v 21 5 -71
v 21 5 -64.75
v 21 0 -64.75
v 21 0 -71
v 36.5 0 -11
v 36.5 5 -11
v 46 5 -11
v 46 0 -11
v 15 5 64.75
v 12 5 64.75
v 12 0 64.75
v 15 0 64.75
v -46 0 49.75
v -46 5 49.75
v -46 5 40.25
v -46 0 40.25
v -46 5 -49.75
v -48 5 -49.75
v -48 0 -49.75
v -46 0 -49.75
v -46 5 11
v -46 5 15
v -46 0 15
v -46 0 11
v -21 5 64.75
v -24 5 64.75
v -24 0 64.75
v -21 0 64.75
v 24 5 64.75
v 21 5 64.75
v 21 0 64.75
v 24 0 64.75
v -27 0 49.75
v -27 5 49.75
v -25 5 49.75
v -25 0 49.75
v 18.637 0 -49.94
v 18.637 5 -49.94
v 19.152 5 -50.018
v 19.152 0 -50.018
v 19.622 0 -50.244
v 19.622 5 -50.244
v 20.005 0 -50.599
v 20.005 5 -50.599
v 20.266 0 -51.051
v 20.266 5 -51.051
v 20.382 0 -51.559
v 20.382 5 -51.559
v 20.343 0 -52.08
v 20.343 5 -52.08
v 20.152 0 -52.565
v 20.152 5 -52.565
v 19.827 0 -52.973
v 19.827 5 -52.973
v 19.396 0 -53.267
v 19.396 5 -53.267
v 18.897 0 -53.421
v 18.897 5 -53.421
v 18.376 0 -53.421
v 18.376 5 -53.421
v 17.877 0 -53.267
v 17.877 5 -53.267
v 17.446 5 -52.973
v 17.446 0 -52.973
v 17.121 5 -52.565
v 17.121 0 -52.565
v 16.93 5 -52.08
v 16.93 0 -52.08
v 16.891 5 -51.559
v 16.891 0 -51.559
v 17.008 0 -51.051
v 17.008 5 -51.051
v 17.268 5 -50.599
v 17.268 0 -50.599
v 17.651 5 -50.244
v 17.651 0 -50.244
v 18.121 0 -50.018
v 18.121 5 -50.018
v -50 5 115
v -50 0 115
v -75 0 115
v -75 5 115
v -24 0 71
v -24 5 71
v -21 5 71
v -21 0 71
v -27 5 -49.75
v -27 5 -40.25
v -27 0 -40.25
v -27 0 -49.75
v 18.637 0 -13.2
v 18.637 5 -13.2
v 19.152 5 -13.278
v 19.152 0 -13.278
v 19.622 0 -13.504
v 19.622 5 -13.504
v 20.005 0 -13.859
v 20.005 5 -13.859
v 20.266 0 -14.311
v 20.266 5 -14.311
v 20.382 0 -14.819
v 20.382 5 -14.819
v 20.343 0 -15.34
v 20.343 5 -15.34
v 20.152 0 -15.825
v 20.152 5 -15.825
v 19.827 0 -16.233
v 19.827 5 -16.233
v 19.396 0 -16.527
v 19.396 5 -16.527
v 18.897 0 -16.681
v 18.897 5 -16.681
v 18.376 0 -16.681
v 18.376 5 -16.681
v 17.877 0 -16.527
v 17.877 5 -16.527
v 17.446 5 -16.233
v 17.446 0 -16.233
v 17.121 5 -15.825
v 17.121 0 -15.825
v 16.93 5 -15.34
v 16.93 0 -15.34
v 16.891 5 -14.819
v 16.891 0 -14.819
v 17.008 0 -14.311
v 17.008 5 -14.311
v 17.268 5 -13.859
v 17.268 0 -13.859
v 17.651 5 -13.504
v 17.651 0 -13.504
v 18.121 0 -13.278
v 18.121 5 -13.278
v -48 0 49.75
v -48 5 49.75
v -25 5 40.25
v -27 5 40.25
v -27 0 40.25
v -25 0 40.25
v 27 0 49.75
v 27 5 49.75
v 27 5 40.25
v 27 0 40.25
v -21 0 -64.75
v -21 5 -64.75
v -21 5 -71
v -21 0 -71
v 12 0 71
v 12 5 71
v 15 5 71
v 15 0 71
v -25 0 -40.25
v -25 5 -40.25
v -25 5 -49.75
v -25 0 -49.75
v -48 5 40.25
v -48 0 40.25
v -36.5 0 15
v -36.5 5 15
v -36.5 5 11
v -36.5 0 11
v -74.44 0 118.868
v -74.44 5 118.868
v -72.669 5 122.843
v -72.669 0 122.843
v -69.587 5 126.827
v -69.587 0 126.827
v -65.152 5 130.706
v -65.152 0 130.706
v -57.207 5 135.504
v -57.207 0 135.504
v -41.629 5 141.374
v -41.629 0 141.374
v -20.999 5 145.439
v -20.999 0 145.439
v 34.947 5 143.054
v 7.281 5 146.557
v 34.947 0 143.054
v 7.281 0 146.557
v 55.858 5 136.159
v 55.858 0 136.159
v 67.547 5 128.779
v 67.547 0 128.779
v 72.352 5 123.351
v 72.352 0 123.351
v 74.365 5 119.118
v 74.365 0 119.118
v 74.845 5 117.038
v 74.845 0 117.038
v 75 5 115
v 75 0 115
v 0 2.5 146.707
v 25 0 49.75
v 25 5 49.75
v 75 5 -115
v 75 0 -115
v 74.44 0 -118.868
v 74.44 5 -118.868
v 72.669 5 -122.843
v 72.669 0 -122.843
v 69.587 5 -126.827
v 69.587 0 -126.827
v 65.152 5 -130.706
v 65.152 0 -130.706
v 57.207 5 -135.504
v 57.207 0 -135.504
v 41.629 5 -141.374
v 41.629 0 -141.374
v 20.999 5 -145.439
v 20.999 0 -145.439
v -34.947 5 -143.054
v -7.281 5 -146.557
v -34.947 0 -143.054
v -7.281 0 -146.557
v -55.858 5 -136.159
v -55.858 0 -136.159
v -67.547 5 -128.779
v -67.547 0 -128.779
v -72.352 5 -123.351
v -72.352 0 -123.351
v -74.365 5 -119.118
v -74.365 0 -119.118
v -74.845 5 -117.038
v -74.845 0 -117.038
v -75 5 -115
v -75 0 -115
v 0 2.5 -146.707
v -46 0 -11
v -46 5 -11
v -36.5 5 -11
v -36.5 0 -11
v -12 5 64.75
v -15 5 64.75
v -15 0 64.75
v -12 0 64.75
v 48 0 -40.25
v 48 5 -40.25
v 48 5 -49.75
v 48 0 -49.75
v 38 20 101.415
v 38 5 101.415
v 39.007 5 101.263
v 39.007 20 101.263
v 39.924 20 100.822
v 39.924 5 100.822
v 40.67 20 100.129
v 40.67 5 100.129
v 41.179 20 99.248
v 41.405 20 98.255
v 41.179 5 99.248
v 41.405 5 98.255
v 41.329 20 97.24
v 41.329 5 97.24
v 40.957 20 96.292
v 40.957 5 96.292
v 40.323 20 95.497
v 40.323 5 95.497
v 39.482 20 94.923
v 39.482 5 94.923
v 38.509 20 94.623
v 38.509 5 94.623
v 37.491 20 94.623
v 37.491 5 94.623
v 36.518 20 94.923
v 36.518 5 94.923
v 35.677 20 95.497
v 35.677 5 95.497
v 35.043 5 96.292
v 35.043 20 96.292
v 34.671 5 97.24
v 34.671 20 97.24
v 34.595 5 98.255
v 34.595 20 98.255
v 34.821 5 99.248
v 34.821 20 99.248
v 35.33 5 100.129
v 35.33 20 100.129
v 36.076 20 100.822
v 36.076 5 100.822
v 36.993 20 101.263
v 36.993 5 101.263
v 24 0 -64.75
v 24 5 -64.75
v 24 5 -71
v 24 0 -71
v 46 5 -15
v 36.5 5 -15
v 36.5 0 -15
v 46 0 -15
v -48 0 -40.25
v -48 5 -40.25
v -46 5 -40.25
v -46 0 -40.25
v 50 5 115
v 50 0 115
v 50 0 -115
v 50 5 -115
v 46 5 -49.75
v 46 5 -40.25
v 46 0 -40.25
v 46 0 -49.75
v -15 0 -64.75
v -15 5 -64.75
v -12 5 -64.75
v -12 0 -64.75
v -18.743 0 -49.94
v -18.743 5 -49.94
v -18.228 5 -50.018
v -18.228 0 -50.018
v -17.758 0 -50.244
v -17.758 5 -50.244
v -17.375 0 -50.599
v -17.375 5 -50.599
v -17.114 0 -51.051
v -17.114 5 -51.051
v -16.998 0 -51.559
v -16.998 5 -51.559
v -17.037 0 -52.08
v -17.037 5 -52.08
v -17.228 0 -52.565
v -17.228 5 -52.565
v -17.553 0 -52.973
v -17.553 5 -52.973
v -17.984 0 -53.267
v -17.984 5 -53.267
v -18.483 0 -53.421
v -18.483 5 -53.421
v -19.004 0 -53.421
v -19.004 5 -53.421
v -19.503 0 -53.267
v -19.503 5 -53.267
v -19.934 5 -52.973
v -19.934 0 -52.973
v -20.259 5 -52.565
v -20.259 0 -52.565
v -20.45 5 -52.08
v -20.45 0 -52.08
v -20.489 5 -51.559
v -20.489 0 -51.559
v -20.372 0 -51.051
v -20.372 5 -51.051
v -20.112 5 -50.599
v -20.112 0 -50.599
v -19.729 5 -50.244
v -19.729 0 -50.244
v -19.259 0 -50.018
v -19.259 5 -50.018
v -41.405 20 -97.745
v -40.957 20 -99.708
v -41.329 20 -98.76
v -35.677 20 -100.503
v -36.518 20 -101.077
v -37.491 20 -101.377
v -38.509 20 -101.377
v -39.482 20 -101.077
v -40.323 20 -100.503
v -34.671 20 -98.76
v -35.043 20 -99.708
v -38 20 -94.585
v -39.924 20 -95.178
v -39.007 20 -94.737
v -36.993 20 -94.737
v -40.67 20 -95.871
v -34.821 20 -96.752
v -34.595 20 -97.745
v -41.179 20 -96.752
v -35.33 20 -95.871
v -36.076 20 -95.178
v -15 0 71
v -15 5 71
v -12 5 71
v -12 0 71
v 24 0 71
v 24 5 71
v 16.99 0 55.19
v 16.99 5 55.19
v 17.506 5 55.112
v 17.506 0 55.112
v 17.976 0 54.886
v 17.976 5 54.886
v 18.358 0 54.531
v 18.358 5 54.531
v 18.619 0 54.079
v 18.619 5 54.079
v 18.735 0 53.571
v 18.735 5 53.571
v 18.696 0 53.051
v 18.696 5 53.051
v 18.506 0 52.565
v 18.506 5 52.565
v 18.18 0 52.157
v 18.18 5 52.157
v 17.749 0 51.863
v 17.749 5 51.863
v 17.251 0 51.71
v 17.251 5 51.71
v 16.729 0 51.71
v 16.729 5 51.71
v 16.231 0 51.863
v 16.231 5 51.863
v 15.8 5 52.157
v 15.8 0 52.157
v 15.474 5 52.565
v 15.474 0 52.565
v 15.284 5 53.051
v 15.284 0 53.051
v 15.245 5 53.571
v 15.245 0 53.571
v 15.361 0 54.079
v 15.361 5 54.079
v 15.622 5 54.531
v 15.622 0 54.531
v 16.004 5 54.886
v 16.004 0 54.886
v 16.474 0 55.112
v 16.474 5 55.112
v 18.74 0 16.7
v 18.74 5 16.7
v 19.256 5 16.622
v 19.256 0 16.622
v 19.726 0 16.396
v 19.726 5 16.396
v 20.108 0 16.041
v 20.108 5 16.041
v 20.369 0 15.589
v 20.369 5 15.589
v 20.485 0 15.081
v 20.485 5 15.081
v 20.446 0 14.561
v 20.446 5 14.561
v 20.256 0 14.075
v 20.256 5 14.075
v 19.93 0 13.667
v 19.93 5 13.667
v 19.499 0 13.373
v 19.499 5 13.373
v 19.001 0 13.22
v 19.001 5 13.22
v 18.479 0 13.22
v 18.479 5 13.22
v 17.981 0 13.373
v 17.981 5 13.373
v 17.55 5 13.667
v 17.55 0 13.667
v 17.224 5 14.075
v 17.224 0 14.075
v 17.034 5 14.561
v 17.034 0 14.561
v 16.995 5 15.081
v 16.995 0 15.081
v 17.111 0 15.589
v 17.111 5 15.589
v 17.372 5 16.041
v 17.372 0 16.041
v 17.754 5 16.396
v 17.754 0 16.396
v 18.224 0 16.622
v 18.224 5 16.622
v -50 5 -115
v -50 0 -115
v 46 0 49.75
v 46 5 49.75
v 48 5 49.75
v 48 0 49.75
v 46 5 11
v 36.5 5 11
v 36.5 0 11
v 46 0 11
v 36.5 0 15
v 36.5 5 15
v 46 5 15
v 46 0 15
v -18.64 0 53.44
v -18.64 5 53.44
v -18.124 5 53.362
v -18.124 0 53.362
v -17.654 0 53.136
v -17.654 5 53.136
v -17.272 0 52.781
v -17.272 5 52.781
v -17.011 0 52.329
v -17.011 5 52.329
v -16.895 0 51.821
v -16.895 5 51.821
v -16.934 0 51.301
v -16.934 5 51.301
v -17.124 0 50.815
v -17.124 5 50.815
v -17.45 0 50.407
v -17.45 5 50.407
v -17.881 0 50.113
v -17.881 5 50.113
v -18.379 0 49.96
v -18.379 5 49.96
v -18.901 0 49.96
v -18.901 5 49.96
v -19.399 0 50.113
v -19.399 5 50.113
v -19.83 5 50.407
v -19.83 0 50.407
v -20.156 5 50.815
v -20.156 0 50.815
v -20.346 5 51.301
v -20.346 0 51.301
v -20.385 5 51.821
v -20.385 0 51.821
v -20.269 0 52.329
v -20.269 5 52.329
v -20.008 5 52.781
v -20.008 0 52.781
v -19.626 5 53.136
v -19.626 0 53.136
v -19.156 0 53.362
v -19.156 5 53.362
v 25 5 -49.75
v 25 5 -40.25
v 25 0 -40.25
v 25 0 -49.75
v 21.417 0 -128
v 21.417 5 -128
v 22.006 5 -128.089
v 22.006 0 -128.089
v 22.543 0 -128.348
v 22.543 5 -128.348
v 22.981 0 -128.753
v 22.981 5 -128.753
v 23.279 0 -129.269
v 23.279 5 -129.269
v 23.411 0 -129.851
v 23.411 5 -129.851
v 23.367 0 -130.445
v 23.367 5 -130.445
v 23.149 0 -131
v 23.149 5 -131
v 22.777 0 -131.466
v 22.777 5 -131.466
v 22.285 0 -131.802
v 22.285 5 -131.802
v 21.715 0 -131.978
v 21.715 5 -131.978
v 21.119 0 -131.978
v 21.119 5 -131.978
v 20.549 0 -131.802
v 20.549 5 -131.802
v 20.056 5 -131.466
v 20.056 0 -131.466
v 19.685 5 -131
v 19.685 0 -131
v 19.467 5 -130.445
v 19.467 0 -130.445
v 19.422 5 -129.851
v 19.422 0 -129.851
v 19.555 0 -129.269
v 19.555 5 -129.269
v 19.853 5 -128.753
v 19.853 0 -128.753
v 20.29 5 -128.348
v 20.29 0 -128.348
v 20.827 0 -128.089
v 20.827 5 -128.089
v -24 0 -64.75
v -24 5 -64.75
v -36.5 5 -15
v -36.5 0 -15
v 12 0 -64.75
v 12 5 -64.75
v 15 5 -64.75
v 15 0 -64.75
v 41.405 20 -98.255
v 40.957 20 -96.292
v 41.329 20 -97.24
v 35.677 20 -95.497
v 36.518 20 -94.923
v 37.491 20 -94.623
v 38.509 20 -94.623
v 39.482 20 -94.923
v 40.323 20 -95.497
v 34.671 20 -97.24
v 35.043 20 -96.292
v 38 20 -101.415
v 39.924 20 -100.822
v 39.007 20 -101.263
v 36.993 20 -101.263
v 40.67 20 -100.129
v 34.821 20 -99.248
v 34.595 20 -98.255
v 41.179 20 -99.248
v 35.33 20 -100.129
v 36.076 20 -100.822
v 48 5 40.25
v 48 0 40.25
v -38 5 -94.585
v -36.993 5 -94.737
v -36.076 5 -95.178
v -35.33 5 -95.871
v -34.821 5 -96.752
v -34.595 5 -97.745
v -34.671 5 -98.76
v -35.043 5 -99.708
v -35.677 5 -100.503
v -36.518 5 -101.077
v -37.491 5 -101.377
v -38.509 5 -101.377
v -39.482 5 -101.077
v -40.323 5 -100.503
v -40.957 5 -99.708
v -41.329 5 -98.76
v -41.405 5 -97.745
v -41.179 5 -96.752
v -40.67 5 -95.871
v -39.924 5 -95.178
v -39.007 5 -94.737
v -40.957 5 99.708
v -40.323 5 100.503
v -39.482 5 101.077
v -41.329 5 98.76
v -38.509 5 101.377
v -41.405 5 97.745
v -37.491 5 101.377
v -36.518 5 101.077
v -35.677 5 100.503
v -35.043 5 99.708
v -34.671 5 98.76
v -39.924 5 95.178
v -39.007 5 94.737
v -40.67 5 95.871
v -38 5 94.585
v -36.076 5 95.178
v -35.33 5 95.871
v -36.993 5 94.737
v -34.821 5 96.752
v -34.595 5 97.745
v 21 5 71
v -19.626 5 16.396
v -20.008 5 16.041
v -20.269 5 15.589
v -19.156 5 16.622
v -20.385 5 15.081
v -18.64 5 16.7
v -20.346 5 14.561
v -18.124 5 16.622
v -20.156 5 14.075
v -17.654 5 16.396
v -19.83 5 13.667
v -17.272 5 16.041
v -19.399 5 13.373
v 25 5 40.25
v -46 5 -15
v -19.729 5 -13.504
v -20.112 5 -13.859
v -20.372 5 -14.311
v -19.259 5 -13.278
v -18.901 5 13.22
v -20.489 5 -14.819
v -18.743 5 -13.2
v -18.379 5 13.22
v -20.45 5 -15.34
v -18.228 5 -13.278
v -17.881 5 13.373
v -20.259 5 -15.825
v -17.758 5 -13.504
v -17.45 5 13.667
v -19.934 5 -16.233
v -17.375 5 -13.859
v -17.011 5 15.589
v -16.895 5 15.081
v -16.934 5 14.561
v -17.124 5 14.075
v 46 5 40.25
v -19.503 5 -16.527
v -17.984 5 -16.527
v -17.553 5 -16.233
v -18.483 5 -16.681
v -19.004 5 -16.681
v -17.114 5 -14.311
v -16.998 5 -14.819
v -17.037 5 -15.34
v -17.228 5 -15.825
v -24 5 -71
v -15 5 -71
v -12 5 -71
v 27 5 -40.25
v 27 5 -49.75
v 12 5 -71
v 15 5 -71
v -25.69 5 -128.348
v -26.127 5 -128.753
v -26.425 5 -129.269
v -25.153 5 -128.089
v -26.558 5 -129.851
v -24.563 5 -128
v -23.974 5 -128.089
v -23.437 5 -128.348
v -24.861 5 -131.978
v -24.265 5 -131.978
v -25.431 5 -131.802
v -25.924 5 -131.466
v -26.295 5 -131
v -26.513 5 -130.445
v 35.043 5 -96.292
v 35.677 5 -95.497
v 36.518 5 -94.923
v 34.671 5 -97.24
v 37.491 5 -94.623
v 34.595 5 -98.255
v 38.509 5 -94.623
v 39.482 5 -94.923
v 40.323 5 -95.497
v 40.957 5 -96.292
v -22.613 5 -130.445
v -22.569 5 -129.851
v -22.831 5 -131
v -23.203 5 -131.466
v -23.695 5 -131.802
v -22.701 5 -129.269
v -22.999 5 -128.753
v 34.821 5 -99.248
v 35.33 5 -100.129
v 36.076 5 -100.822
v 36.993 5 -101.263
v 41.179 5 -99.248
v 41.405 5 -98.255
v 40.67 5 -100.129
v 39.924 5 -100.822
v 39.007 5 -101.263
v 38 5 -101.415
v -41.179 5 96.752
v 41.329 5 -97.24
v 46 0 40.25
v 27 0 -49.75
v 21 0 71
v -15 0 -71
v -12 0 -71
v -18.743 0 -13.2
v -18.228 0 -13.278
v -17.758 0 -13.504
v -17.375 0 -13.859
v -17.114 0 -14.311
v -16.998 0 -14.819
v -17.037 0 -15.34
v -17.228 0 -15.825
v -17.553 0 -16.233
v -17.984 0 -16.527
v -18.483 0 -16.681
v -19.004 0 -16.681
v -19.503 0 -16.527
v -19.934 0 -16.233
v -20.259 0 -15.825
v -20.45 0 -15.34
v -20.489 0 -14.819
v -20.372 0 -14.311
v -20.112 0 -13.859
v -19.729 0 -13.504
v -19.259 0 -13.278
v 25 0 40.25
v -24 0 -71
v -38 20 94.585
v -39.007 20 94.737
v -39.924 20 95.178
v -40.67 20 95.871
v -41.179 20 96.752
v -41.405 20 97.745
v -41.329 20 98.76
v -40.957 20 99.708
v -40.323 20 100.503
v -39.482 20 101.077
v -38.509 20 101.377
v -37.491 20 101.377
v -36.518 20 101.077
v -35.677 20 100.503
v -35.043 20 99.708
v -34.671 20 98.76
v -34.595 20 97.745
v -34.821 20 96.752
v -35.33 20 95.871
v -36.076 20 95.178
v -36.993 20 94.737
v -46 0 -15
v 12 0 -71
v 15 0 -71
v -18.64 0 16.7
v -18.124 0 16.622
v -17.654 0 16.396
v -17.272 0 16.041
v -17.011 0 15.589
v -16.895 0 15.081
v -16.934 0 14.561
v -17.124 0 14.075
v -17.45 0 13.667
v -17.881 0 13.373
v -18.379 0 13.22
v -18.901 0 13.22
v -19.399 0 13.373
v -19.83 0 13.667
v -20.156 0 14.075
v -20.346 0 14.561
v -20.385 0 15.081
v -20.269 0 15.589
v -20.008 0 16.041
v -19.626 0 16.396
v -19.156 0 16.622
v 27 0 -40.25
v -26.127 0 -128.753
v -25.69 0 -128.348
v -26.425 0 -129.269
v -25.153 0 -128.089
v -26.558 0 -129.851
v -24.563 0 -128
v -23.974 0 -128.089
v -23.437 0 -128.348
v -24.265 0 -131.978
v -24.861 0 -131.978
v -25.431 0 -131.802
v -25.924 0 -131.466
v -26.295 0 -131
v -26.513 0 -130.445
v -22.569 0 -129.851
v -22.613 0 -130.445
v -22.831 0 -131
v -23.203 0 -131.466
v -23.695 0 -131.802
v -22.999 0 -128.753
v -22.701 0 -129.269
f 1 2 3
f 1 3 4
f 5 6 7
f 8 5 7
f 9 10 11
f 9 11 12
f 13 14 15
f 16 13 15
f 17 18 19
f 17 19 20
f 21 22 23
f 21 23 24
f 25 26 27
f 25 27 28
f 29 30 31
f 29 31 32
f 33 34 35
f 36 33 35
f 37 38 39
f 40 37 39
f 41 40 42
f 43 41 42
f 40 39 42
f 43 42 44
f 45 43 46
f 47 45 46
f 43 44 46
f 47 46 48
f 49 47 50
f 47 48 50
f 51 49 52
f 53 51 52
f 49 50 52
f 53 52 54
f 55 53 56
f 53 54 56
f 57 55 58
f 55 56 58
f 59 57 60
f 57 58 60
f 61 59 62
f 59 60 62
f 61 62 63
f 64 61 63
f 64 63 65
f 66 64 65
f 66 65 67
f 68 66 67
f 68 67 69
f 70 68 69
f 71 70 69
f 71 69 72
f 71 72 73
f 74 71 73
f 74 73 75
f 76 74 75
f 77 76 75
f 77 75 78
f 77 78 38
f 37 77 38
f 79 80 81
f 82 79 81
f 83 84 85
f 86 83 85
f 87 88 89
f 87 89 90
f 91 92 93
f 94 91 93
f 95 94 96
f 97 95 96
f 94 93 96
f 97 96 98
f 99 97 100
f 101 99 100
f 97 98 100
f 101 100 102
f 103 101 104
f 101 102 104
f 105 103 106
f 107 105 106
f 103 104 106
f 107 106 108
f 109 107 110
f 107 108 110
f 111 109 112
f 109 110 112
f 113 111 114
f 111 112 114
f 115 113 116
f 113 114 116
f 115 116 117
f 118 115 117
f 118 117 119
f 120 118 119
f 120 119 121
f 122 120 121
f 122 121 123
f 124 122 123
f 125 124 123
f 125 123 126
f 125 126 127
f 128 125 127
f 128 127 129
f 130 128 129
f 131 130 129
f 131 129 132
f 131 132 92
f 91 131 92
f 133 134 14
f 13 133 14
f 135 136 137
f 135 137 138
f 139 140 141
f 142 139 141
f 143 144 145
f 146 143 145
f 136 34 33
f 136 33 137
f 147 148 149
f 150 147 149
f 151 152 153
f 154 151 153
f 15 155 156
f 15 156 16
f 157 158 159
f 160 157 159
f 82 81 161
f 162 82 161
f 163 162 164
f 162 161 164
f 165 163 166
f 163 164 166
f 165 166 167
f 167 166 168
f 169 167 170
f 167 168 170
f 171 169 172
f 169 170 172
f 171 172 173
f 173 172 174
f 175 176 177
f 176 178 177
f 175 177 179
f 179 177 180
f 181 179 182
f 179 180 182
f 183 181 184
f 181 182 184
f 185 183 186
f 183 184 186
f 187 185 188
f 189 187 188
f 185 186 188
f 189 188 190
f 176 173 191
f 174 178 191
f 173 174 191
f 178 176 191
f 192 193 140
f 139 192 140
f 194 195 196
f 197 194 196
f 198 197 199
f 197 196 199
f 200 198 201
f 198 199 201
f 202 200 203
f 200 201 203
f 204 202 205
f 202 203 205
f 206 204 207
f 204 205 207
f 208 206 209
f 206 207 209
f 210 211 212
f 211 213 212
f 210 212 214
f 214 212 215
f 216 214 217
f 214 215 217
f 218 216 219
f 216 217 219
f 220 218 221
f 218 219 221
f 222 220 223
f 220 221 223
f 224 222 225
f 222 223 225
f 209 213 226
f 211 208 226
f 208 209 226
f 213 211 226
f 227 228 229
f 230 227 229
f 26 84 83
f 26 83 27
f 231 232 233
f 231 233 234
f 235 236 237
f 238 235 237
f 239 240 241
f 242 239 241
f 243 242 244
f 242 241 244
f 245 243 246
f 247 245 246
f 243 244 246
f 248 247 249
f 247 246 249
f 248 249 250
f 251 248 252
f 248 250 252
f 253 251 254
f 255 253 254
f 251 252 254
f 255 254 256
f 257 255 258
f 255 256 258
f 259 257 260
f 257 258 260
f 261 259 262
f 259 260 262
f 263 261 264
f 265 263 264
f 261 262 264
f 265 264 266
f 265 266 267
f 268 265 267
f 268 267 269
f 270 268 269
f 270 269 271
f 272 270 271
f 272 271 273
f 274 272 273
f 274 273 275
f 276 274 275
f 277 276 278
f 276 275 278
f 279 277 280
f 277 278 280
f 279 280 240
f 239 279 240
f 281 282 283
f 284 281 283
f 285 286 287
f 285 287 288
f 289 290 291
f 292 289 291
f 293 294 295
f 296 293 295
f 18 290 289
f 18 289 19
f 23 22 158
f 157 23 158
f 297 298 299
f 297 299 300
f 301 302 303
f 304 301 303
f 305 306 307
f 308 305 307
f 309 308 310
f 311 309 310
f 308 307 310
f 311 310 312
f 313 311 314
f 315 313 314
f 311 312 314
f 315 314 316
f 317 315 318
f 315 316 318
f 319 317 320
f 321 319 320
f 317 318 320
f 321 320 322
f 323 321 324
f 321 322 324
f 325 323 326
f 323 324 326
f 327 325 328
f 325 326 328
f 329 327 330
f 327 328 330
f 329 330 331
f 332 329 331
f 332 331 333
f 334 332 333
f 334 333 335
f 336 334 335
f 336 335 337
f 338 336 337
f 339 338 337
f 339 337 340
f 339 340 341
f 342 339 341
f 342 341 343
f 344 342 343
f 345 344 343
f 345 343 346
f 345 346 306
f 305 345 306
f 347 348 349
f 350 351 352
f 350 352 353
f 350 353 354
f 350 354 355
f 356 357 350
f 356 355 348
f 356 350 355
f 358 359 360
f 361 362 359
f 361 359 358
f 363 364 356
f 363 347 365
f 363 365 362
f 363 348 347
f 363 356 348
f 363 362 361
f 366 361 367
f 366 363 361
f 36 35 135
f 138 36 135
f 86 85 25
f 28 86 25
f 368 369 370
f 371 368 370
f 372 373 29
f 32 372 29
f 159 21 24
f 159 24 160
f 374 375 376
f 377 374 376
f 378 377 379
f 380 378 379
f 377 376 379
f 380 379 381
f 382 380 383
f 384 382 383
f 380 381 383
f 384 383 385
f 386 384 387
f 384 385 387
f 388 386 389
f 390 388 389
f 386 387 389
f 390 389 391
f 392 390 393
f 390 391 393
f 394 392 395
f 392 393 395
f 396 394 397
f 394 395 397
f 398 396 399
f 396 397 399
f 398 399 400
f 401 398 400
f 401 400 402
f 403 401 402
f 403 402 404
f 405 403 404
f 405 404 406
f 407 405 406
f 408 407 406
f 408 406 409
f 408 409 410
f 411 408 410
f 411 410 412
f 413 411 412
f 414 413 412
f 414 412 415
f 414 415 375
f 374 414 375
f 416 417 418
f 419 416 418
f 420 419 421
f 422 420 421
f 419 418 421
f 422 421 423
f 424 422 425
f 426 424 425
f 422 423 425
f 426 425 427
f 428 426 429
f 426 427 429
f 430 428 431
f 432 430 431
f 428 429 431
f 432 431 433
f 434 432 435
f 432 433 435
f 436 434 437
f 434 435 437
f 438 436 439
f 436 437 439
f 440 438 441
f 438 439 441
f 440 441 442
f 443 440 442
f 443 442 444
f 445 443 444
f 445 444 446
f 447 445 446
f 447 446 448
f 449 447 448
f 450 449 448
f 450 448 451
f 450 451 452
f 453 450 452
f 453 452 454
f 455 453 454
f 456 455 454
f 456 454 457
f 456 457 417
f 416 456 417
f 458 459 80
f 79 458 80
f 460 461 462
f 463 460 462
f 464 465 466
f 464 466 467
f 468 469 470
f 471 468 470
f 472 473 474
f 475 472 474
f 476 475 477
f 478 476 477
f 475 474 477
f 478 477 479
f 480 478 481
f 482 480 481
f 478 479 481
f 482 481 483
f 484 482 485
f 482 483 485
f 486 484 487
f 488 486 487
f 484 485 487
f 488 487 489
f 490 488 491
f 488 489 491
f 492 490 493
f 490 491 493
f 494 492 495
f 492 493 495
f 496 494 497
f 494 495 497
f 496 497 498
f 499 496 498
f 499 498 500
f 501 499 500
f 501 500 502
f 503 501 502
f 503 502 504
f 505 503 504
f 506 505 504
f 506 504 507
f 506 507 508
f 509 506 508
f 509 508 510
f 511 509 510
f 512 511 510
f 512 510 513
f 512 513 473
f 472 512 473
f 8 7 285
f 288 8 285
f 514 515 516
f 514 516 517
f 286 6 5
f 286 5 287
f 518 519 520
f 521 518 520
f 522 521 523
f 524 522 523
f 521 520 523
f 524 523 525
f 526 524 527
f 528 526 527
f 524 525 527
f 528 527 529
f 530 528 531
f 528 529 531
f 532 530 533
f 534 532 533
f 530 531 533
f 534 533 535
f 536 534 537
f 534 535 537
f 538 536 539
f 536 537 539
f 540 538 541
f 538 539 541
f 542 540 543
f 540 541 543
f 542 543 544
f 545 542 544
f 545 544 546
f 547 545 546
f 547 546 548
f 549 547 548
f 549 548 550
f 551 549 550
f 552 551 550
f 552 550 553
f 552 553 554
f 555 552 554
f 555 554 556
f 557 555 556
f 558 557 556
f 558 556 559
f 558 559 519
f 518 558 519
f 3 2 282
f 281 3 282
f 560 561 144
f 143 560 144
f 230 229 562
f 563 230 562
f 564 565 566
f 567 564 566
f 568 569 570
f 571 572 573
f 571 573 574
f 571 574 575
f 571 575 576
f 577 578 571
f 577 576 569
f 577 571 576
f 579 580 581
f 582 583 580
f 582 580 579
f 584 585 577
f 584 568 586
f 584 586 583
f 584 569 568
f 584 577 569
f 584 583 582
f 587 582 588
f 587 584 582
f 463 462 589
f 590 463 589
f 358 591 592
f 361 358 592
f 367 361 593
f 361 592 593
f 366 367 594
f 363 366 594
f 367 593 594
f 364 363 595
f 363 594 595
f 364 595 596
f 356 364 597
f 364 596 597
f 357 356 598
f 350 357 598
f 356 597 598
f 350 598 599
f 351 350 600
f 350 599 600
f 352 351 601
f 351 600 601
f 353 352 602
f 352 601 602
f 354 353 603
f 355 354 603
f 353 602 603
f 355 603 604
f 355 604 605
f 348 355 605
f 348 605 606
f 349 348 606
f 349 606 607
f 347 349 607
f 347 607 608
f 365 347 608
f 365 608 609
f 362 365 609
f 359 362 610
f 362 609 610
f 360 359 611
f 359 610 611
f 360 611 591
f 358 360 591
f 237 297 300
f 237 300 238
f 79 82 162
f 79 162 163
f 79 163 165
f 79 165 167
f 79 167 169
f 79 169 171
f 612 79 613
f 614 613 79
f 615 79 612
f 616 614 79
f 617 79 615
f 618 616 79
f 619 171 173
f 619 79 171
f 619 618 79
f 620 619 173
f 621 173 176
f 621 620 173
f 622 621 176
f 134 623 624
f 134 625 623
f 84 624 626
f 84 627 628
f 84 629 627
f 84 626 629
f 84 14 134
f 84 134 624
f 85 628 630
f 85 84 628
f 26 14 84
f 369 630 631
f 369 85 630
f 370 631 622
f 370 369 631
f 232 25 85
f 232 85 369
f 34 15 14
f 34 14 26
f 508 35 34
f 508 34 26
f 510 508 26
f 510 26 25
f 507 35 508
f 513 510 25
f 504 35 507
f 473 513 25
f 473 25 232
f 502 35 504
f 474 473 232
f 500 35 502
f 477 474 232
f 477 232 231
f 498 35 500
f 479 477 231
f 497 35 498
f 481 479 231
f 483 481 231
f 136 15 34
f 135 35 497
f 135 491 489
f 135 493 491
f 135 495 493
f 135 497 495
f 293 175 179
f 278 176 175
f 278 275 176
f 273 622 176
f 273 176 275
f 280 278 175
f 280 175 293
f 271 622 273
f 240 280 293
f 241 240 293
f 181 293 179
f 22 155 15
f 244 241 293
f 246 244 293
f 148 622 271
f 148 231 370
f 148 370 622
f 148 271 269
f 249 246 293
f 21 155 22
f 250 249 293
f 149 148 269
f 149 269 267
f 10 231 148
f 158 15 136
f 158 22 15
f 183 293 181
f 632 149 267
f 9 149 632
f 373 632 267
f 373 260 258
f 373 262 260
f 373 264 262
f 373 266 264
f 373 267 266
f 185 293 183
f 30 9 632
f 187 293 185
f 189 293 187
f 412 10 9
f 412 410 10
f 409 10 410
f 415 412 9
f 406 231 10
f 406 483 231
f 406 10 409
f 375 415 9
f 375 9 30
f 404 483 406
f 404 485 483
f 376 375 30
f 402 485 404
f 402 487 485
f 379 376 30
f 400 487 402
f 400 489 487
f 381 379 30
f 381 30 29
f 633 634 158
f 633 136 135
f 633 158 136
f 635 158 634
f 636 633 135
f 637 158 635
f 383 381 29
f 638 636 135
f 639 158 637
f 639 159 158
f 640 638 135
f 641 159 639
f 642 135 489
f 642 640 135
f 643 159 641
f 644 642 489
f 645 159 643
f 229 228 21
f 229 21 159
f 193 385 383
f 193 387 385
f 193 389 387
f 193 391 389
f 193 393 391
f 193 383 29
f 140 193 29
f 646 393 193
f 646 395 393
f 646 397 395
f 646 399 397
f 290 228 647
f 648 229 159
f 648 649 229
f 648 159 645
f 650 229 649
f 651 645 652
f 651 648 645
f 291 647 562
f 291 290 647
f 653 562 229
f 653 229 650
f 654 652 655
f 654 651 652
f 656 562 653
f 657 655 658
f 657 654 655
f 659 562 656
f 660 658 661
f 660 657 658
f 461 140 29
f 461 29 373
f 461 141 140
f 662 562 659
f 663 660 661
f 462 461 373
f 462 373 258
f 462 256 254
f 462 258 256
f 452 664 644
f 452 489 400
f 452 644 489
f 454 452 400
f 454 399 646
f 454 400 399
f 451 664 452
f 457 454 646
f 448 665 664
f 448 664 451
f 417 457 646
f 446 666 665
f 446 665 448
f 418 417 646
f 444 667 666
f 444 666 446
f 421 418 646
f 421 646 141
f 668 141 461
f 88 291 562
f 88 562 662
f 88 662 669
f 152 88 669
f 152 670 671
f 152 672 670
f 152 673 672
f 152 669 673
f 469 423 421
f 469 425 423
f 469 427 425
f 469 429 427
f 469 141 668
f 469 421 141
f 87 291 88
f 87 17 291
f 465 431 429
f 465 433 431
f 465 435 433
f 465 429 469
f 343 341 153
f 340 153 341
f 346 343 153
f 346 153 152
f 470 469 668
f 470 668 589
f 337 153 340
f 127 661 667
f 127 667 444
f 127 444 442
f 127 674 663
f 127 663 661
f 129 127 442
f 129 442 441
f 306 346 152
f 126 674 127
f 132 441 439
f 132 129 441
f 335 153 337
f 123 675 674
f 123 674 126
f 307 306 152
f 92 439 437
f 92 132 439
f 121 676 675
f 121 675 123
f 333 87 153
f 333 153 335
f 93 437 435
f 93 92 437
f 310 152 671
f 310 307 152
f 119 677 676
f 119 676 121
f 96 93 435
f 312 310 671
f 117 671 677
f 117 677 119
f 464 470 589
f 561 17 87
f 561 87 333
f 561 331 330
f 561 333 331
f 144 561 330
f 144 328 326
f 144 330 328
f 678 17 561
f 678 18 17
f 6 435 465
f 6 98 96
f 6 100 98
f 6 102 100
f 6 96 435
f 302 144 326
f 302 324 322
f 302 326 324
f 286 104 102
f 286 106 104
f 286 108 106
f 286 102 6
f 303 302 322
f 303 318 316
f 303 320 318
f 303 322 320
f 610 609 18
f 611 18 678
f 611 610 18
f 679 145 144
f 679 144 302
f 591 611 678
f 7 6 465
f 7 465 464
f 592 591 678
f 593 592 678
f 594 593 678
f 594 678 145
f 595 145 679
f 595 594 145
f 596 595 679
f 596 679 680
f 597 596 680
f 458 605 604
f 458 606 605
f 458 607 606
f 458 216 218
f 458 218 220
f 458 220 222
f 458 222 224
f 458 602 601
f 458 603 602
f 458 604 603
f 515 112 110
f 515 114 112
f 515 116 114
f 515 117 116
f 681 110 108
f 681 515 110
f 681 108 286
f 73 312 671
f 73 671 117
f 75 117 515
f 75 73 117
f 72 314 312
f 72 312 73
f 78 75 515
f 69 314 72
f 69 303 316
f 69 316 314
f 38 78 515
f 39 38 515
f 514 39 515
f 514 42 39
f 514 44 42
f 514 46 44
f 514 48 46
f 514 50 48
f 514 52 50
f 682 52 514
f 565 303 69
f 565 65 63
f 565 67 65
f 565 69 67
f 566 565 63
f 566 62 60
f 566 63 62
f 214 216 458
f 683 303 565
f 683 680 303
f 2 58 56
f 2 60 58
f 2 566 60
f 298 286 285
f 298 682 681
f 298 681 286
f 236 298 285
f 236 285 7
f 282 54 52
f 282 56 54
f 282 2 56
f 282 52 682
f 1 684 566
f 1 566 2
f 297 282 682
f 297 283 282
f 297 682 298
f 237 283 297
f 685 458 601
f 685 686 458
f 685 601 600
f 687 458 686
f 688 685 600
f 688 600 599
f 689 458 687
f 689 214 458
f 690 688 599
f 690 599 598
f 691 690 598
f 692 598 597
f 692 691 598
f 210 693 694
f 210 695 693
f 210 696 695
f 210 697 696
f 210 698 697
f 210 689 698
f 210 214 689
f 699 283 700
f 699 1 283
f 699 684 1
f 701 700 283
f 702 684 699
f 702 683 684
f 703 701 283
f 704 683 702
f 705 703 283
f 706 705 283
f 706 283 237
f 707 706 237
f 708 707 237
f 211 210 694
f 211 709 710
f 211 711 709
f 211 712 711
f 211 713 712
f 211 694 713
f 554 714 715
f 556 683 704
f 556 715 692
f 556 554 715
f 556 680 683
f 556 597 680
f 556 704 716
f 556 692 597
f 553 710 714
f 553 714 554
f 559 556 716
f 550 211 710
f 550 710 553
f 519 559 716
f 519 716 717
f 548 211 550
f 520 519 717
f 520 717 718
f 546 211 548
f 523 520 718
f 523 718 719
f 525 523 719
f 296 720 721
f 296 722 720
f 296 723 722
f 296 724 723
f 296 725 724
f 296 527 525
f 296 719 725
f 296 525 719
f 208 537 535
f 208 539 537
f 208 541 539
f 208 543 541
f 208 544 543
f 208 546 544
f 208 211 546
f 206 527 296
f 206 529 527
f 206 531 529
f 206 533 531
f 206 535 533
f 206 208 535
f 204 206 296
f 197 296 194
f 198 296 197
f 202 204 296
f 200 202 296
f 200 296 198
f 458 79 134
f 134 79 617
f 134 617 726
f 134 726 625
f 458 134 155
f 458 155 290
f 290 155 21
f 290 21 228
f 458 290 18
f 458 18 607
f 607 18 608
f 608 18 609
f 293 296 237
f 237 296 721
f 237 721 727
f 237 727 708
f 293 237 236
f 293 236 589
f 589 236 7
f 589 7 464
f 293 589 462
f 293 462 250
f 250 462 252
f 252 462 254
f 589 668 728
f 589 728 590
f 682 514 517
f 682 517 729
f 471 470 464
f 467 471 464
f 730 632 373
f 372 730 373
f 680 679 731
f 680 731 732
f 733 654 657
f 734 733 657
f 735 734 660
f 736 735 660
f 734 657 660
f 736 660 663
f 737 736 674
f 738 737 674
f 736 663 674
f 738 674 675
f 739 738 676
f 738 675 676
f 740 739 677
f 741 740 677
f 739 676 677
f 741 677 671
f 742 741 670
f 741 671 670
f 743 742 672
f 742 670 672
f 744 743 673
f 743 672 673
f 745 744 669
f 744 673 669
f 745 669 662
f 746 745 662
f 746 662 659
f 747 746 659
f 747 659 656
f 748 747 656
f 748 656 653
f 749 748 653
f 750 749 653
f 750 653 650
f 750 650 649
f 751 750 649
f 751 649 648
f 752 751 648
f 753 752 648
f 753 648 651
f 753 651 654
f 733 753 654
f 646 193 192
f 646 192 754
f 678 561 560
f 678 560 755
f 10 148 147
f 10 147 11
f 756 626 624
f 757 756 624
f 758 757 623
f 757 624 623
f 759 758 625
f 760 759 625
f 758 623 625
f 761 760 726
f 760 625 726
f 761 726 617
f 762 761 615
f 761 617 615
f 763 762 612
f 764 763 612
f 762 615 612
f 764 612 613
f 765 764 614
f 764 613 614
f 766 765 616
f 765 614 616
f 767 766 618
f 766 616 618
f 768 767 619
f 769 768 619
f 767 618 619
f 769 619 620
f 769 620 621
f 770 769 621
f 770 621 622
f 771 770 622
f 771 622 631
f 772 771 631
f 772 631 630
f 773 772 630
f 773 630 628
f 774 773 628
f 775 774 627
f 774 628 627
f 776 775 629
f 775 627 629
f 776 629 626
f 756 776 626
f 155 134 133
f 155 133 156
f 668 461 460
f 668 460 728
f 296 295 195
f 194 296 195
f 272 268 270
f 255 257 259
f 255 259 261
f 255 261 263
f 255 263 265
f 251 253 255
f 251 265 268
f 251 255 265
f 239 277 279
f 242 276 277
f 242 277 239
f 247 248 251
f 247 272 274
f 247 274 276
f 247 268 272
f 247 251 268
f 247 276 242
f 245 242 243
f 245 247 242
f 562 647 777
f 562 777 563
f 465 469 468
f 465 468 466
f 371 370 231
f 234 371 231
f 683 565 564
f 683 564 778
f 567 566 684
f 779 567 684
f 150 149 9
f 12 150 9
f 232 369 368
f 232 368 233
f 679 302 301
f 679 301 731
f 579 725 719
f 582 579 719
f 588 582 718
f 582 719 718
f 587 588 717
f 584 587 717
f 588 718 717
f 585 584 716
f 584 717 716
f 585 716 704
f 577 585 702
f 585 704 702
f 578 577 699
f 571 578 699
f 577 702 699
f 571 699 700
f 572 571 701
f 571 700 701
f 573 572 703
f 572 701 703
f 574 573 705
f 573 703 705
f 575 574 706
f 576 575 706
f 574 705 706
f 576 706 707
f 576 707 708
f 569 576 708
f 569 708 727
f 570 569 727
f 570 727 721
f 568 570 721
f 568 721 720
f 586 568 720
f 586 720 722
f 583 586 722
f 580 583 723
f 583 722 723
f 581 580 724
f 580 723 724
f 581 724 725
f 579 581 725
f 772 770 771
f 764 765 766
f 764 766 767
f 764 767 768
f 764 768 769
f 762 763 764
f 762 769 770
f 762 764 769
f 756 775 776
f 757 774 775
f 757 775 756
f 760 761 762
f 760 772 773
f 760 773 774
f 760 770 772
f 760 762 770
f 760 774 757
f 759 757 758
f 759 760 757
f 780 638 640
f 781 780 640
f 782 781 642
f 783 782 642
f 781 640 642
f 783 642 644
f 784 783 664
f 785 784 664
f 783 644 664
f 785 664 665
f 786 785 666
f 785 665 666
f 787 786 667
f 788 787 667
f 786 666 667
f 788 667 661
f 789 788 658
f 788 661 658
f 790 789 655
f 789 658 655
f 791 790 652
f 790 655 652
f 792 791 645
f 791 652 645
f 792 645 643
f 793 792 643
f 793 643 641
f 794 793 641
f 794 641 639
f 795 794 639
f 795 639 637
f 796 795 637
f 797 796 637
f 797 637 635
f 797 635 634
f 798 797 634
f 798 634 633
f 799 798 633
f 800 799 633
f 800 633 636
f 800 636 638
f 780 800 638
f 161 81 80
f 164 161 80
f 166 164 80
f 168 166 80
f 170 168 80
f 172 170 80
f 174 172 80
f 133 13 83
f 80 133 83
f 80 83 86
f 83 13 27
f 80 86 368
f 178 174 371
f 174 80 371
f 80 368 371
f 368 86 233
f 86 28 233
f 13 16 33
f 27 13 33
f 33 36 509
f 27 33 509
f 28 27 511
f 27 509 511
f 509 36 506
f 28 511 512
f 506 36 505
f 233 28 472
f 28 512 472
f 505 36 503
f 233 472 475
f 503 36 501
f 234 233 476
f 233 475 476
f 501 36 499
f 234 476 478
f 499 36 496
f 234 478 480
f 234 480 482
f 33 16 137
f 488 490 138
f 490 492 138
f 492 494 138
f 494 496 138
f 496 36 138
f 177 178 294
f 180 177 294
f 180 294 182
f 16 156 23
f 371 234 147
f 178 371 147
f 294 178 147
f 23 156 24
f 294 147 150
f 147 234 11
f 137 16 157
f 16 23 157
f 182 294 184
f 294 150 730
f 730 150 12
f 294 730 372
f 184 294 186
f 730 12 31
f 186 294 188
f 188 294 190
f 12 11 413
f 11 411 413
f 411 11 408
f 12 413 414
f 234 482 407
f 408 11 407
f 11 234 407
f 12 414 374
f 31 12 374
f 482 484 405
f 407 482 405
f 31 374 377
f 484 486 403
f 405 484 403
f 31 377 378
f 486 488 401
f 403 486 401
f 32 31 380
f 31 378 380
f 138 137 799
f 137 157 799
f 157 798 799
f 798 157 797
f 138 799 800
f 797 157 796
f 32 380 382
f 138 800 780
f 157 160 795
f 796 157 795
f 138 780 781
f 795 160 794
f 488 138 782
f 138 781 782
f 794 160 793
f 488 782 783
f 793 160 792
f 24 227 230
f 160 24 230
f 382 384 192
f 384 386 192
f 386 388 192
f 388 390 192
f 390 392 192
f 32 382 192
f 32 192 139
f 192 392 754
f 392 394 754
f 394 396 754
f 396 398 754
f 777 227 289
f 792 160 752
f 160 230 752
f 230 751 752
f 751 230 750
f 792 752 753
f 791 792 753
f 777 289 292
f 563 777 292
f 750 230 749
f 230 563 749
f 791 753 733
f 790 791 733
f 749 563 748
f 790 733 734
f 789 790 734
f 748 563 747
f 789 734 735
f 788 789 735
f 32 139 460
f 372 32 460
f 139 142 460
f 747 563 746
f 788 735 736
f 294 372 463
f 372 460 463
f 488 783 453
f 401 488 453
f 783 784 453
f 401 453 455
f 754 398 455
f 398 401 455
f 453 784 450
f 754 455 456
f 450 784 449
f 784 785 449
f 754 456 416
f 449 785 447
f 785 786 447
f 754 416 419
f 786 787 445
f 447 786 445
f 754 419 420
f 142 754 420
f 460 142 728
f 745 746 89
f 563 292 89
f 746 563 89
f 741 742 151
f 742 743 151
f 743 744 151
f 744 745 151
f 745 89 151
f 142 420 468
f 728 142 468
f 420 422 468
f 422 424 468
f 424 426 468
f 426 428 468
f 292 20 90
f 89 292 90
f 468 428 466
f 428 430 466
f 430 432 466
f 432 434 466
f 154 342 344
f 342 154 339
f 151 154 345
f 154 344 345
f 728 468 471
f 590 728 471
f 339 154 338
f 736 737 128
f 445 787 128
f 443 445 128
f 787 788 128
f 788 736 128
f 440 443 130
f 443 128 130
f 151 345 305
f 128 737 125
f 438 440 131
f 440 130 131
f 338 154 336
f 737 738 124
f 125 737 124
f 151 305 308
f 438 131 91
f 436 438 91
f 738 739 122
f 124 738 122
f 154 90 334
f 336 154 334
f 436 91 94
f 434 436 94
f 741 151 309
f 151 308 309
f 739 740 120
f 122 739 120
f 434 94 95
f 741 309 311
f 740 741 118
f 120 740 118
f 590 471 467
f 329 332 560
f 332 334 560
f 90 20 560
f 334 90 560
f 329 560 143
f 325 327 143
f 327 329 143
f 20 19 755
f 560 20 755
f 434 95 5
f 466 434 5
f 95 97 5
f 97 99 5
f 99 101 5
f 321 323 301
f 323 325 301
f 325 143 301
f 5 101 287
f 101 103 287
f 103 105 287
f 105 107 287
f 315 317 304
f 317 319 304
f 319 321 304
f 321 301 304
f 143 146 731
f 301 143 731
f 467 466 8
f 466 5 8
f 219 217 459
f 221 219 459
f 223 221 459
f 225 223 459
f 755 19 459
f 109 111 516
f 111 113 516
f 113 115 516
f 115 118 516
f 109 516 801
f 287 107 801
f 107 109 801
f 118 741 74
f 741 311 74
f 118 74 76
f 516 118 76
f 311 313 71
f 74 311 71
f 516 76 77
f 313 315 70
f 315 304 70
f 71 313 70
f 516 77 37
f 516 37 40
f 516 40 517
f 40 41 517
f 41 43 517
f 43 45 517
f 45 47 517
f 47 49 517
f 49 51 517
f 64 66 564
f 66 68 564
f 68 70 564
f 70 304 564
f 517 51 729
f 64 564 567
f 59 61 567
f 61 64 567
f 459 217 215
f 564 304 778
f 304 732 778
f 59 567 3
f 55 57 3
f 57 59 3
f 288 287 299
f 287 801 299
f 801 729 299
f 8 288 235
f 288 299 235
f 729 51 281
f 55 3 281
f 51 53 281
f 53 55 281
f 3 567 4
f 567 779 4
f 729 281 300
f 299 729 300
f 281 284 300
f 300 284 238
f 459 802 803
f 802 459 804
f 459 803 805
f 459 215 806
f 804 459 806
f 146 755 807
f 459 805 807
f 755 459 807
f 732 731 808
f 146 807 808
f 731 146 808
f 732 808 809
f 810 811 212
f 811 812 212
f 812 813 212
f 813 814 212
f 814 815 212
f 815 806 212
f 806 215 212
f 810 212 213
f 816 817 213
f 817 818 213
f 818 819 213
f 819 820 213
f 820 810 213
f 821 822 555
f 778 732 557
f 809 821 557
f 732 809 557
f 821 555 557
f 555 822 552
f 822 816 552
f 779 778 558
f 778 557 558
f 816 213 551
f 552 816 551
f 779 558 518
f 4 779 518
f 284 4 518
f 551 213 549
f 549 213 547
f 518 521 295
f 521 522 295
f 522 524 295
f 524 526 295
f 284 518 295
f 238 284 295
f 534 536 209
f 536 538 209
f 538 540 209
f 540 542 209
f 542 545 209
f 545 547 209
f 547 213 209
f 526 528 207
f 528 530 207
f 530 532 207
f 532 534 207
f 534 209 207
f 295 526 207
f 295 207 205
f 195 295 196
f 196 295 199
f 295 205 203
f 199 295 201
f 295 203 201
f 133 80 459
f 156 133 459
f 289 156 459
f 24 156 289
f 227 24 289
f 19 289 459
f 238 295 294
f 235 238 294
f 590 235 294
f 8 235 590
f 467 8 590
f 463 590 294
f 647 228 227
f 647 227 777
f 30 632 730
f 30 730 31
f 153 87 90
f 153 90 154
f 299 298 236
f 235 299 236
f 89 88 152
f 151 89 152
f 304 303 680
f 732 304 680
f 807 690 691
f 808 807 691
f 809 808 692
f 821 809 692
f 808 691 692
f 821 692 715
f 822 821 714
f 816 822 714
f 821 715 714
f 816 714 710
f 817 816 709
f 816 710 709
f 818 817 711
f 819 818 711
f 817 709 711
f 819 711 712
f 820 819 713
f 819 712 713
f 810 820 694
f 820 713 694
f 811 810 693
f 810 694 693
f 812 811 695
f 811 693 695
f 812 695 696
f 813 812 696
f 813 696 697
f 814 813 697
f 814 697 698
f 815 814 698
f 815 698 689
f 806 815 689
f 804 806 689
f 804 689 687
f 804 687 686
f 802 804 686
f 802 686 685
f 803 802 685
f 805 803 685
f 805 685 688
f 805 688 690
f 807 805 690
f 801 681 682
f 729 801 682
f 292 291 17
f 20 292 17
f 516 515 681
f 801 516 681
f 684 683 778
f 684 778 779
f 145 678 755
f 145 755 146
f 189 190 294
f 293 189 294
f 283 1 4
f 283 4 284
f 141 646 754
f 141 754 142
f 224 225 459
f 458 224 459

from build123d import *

# Parameters (mm, degrees)
BOSS_EXTRUDE10_DEPTH = 5
SKETCH9_W            = 2
SKETCH9_H            = 9.5
CUT_EXTRUDE2_DEPTH   = 165.842149126
SKETCH10_W           = 3
SKETCH10_H           = 6.25
CUT_EXTRUDE3_DEPTH   = 165.842149126
SKETCH11_W           = 9.5
SKETCH11_H           = 4
CUT_EXTRUDE4_DEPTH   = 165.842149126
SKETCH13_R           = 3.415
BOSS_EXTRUDE11_DEPTH = 15
SKETCH14_R           = 1.75
CUT_EXTRUDE5_DEPTH   = 166.447677915
SKETCH15_R           = 2
CUT_EXTRUDE6_DEPTH   = 166.447677915


with BuildPart() as part:
    # Sketch6 → Boss-Extrude10 (new body)
    with BuildSketch(Plane(origin=(0, 0, 0), x_dir=(1, 0, 0), z_dir=(0, 1, 0))):
        with BuildLine():
            Line((-75, 115), (-50, 115))
            Line((-50, 115), (50, 115))
            Line((50, 115), (75, 115))
            add(Edge.make_bspline(
                [(75, 115), (75, 146.706966716), (0, 146.706966716), (-75, 146.706966716), (-75, 115)],
                knots=[0, 0, 0, 1.570796327, 1.570796327, 3.141592654, 3.141592654, 3.141592654], degree=2, weights=[1, 0.707106781, 1, 0.707106781, 1]))
        make_face()
        with BuildLine():
            Line((-50, 115), (-50, 91.367022354))
            add(Edge.make_bspline(
                [(-50, 91.367022354), (0, 72.460640237), (50, 91.367022354)],
                knots=[3.982661324, 3.982661324, 3.982661324, 5.442116637, 5.442116637, 5.442116637], degree=2, weights=[1, 0.745355992, 1]))
            Line((50, 91.367022354), (50, 115))
            Line((50, 115), (-50, 115))
        make_face()
        with BuildLine():
            Line((-50, 91.367022354), (-50, -91.367022354))
            add(Edge.make_bspline(
                [(50, -91.367022354), (0, -72.460640237), (-50, -91.367022354)],
                knots=[0.841068671, 0.841068671, 0.841068671, 2.300523983, 2.300523983, 2.300523983], degree=2, weights=[1, 0.745355992, 1]))
            Line((50, -91.367022354), (50, 91.367022354))
            add(Edge.make_bspline(
                [(-50, 91.367022354), (0, 72.460640237), (50, 91.367022354)],
                knots=[3.982661324, 3.982661324, 3.982661324, 5.442116637, 5.442116637, 5.442116637], degree=2, weights=[1, 0.745355992, 1]))
        make_face()
        with BuildLine():
            Line((-50, -91.367022354), (-50, -115))
            Line((-50, -115), (50, -115))
            Line((50, -115), (50, -91.367022354))
            add(Edge.make_bspline(
                [(50, -91.367022354), (0, -72.460640237), (-50, -91.367022354)],
                knots=[0.841068671, 0.841068671, 0.841068671, 2.300523983, 2.300523983, 2.300523983], degree=2, weights=[1, 0.745355992, 1]))
        make_face()
        with BuildLine():
            Line((-50, -115), (-75, -115))
            add(Edge.make_bspline(
                [(-75, -115), (-75, -146.706966716), (0, -146.706966716), (75, -146.706966716), (75, -115)],
                knots=[3.141592654, 3.141592654, 3.141592654, 4.71238898, 4.71238898, 6.283185307, 6.283185307, 6.283185307], degree=2, weights=[1, 0.707106781, 1, 0.707106781, 1]))
            Line((75, -115), (50, -115))
            Line((50, -115), (-50, -115))
        make_face()
    extrude(amount=BOSS_EXTRUDE10_DEPTH)

    # Sketch9 → Cut-Extrude2 (cut, through all)
    with BuildSketch(Plane(origin=(0, 5, 0), x_dir=(1, 0, 0), z_dir=(0, 1, 0))):
        with Locations((-47, 45)):
            Rectangle(SKETCH9_W, SKETCH9_H)
        with Locations((-47, -45)):
            Rectangle(SKETCH9_W, SKETCH9_H)
        with Locations((47, 45)):
            Rectangle(SKETCH9_W, SKETCH9_H)
        with Locations((47, -45)):
            Rectangle(SKETCH9_W, SKETCH9_H)
        with Locations((-26, 45)):
            Rectangle(SKETCH9_W, SKETCH9_H)
        with Locations((-26, -45)):
            Rectangle(SKETCH9_W, SKETCH9_H)
        with Locations((26, -45)):
            Rectangle(SKETCH9_W, SKETCH9_H)
        with Locations((26, 45)):
            Rectangle(SKETCH9_W, SKETCH9_H)
    extrude(amount=-CUT_EXTRUDE2_DEPTH, mode=Mode.SUBTRACT)

    # Sketch10 → Cut-Extrude3 (cut, through all)
    with BuildSketch(Plane(origin=(0, 5, 0), x_dir=(1, 0, 0), z_dir=(0, 1, 0))):
        with Locations((-22.5, -67.875)):
            Rectangle(SKETCH10_W, SKETCH10_H)
        with Locations((-13.5, -67.875)):
            Rectangle(SKETCH10_W, SKETCH10_H)
        with Locations((13.5, -67.875)):
            Rectangle(SKETCH10_W, SKETCH10_H)
        with Locations((22.5, -67.875)):
            Rectangle(SKETCH10_W, SKETCH10_H)
        with Locations((22.5, 67.875)):
            Rectangle(SKETCH10_W, SKETCH10_H)
        with Locations((13.5, 67.875)):
            Rectangle(SKETCH10_W, SKETCH10_H)
        with Locations((-13.5, 67.875)):
            Rectangle(SKETCH10_W, SKETCH10_H)
        with Locations((-22.5, 67.875)):
            Rectangle(SKETCH10_W, SKETCH10_H)
    extrude(amount=-CUT_EXTRUDE3_DEPTH, mode=Mode.SUBTRACT)

    # Sketch11 → Cut-Extrude4 (cut, through all)
    with BuildSketch(Plane(origin=(0, 5, 0), x_dir=(1, 0, 0), z_dir=(0, 1, 0))):
        with Locations((41.25, -13)):
            Rectangle(SKETCH11_W, SKETCH11_H)
        with Locations((-41.25, -13)):
            Rectangle(SKETCH11_W, SKETCH11_H)
        with Locations((41.25, 13)):
            Rectangle(SKETCH11_W, SKETCH11_H)
        with Locations((-41.25, 13)):
            Rectangle(SKETCH11_W, SKETCH11_H)
    extrude(amount=-CUT_EXTRUDE4_DEPTH, mode=Mode.SUBTRACT)

    # Sketch13 → Boss-Extrude11 (add)
    with BuildSketch(Plane(origin=(0, 5, 0), x_dir=(1, 0, 0), z_dir=(0, 1, 0))):
        with Locations(Location((-38, 98, 0), (0, 0, 270))):
            Circle(SKETCH13_R)
        with Locations(Location((38, 98, 0), (0, 0, 90))):
            Circle(SKETCH13_R)
        with Locations(Location((38, -98, 0), (0, 0, 270))):
            Circle(SKETCH13_R)
        with Locations(Location((-38, -98, 0), (0, 0, 90))):
            Circle(SKETCH13_R)
    extrude(amount=BOSS_EXTRUDE11_DEPTH)

    # Sketch14 → Cut-Extrude5 (cut, through all)
    with BuildSketch(Plane(origin=(0, 5, 0), x_dir=(1, 0, 0), z_dir=(0, 1, 0))):
        with Locations(Location((-18.743448707, 14.950188424, 0), (0, 0, 270))):
            Circle(SKETCH14_R)
        with Locations(Location((-18.743448707, 51.690188424, 0), (0, 0, 270))):
            Circle(SKETCH14_R)
        with Locations(Location((18.636551293, 51.690188424, 0), (0, 0, 270))):
            Circle(SKETCH14_R)
        with Locations(Location((18.636551293, 14.950188424, 0), (0, 0, 270))):
            Circle(SKETCH14_R)
        with Locations(Location((-18.64, -51.69, 0), (0, 0, 270))):
            Circle(SKETCH14_R)
        with Locations(Location((-18.64, -14.95, 0), (0, 0, 270))):
            Circle(SKETCH14_R)
        with Locations(Location((18.74, -14.95, 0), (0, 0, 270))):
            Circle(SKETCH14_R)
        with Locations(Location((16.99, -53.44, 0), (0, 0, 270))):
            Circle(SKETCH14_R)
    extrude(amount=-CUT_EXTRUDE5_DEPTH, mode=Mode.SUBTRACT)

    # Sketch15 → Cut-Extrude6 (cut, through all)
    with BuildSketch(Plane(origin=(0, 5, 0), x_dir=(1, 0, 0), z_dir=(0, 1, 0))):
        with Locations(Location((-24.563162079, 130, 0), (0, 0, 270))):
            Circle(SKETCH15_R)
        with Locations(Location((21.416837921, 130, 0), (0, 0, 270))):
            Circle(SKETCH15_R)
    extrude(amount=-CUT_EXTRUDE6_DEPTH, mode=Mode.SUBTRACT)


solid = part.part
